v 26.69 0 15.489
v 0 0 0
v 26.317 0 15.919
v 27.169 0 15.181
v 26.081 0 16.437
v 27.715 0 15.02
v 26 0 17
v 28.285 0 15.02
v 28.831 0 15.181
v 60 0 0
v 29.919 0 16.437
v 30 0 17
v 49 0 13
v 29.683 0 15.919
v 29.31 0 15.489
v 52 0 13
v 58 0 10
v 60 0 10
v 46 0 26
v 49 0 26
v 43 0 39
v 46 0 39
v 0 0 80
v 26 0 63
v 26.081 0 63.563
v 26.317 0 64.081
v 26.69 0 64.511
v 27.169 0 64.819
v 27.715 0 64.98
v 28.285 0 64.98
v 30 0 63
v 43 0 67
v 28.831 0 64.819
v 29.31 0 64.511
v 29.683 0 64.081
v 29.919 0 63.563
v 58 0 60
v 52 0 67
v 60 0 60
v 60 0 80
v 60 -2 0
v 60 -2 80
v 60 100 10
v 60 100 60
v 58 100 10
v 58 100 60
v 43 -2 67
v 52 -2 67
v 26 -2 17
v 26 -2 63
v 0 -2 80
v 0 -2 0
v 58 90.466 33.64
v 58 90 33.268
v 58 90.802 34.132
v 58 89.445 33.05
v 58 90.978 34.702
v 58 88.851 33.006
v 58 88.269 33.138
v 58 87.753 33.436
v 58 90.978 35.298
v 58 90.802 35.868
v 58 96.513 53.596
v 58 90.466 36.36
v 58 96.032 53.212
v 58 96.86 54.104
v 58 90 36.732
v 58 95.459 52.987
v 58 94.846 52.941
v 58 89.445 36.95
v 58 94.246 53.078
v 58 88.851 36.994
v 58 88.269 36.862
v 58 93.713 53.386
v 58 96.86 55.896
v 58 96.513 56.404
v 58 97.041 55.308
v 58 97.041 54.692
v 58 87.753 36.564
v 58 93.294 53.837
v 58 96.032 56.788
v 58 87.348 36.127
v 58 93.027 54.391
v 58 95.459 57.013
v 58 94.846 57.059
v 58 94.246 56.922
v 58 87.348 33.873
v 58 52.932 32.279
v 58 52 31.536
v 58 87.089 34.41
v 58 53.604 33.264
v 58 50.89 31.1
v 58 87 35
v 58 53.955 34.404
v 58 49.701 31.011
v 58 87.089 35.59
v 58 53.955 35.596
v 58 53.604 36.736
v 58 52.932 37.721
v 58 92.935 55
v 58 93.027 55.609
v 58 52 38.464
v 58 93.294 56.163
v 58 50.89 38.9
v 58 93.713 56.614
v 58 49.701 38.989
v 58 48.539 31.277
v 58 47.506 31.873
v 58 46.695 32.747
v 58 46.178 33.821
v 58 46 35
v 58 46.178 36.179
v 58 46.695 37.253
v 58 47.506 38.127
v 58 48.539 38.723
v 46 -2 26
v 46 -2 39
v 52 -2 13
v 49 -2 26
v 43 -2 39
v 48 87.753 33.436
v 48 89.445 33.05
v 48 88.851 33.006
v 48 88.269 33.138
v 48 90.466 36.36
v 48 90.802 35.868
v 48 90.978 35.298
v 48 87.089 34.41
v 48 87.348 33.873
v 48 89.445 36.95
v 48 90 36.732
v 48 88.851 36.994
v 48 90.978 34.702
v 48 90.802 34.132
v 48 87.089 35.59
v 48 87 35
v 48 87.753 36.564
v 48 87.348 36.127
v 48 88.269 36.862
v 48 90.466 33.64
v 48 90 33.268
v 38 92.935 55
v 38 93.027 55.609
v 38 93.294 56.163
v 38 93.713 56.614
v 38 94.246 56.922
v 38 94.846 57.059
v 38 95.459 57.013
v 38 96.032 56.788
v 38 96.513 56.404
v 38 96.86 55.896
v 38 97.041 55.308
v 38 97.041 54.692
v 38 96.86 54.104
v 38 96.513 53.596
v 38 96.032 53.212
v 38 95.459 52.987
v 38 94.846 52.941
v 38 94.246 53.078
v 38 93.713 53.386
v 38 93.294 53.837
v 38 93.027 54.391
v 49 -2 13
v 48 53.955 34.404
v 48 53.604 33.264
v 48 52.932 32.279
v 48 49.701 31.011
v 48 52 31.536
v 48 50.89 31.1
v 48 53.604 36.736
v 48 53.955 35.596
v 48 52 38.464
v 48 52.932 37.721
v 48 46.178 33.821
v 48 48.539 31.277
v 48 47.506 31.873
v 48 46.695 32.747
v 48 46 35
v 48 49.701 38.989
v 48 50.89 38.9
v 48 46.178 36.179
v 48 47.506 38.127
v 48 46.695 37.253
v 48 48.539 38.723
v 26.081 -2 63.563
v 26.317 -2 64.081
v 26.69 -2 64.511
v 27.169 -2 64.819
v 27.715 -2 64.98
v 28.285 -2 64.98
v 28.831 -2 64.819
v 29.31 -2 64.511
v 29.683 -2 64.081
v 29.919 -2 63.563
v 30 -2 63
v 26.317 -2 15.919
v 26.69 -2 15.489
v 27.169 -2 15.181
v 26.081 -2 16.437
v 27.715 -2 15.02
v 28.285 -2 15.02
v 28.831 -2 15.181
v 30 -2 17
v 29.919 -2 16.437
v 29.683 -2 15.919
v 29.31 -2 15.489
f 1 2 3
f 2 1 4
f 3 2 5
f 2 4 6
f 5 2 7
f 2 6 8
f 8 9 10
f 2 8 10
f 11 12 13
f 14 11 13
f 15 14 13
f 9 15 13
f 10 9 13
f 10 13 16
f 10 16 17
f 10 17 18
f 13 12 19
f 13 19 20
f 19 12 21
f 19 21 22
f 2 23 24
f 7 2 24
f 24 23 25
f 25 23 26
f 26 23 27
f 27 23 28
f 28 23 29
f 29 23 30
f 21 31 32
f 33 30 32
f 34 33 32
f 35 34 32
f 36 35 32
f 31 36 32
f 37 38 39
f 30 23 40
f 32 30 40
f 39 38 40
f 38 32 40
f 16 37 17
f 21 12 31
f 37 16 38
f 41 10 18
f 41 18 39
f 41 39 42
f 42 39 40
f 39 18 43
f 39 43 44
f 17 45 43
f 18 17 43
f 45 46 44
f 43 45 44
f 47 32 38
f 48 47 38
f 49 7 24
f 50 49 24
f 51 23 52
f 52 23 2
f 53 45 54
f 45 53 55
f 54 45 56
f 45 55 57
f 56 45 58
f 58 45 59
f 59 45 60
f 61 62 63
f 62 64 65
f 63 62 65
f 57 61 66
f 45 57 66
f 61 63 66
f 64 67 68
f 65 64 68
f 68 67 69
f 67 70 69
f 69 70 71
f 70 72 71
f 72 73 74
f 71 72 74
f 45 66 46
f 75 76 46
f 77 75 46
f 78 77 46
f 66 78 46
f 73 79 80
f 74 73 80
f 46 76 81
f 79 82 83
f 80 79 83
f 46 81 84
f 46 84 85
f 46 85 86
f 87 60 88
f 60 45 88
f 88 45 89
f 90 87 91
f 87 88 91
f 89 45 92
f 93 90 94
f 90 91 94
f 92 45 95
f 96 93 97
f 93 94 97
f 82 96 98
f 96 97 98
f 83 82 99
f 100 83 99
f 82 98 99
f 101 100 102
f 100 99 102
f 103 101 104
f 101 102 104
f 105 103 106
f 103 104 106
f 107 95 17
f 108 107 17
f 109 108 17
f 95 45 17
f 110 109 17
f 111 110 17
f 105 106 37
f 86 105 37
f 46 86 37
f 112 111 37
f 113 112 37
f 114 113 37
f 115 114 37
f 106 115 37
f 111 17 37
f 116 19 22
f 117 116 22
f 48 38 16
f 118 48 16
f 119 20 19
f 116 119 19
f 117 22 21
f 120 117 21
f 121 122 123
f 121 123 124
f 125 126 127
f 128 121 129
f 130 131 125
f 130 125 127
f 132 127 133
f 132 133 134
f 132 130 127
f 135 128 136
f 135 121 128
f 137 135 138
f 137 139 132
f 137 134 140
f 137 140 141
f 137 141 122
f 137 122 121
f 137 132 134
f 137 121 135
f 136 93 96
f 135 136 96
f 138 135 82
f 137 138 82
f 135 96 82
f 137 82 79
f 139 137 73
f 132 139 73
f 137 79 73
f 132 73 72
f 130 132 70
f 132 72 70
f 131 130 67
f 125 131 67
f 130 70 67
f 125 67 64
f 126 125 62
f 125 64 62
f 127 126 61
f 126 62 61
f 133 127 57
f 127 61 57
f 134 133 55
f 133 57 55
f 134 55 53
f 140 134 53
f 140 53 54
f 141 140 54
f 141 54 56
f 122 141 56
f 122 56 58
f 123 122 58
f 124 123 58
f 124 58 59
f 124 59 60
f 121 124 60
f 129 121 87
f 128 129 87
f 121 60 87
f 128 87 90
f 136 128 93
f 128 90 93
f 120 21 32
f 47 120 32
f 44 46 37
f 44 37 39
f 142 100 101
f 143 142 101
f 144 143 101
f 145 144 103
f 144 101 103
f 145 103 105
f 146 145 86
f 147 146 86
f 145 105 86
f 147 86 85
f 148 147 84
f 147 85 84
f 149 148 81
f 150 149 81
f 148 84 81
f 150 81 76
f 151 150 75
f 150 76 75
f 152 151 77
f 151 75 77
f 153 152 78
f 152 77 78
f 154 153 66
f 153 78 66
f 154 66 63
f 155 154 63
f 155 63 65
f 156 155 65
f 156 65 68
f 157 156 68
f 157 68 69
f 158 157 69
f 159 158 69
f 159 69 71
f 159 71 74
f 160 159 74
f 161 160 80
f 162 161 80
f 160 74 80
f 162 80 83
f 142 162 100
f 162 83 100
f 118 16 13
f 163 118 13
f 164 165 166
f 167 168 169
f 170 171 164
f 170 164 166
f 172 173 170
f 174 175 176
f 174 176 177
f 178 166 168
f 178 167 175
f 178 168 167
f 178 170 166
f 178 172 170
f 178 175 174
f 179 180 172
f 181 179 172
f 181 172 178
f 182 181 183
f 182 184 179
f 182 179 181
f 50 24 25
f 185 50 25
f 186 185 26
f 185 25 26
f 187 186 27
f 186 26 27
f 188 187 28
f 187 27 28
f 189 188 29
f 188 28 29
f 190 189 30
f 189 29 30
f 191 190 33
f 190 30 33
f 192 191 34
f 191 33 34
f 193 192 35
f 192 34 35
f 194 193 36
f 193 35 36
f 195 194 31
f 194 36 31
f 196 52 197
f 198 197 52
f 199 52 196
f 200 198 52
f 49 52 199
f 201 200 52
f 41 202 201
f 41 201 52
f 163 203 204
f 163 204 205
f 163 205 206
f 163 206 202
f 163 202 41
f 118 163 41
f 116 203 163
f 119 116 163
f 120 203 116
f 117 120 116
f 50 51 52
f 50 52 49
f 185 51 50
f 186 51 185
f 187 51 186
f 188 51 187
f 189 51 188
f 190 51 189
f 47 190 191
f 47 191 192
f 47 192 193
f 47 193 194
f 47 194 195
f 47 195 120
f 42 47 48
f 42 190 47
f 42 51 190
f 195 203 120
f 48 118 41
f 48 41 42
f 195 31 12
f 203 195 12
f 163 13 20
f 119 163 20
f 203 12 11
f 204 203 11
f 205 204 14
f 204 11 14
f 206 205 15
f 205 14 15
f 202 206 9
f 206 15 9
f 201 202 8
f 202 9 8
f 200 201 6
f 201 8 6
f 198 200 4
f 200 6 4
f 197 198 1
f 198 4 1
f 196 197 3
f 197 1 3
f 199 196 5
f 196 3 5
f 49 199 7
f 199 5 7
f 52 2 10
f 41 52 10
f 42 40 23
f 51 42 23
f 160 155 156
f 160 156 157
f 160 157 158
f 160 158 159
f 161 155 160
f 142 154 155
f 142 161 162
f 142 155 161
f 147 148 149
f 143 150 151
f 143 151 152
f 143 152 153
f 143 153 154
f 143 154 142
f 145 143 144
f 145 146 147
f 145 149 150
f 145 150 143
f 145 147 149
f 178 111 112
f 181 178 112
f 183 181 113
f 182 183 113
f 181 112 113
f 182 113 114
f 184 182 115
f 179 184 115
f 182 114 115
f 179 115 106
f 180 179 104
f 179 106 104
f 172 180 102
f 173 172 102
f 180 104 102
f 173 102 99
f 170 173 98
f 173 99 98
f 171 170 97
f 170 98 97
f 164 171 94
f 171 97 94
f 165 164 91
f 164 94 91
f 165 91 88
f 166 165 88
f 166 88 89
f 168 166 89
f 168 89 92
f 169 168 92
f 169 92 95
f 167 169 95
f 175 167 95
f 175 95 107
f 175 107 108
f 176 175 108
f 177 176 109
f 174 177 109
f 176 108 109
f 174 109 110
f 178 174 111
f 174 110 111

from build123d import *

# Parameters (mm, degrees)
F0_W     = 2
F0_H     = 50
F1_DEPTH = 2
F2_DEPTH = 100
F3_R     = 4
F3_R_2   = 2
F4_DEPTH = 10
F3_R_3   = 2.064533
F5_DEPTH = 20


with BuildPart() as f1:
    # F0 (on Front) → F1 (new body)
    with BuildSketch(Plane.XZ):
        Polygon((0, 80), (0, 0), (60, 0), (60, 10), (58, 10), (58, 60), (60, 60), (60, 80), align=None)
        with BuildLine():
            Line((26, 17), (26, 63))
            ThreePointArc((26, 63), (28, 65), (30, 63))
            Line((30, 63), (30, 17))
            ThreePointArc((30, 17), (28, 15), (26, 17))
        make_face(mode=Mode.SUBTRACT)
        Polygon((43, 67), (52, 67), (52, 13), (49, 13), (49, 26), (46, 26), (46, 39), (43, 39), align=None, mode=Mode.SUBTRACT)
        with Locations((59, 35)):
            Rectangle(F0_W, F0_H)
    extrude(amount=F1_DEPTH)

    # F0 (on Front) → F2 (join)
    with BuildSketch(Plane.XZ):
        with Locations((59, 35)):
            Rectangle(F0_W, F0_H)
    extrude(amount=-F2_DEPTH)

    # F3 (on face) → F4 (join)
    with BuildSketch(Plane(origin=(58, 0, 0), x_dir=(0, -1, 0), z_dir=(-1, 0, 0))):
        with Locations((-50, 35)):
            Circle(F3_R)
        with Locations((-89, 35)):
            Circle(F3_R_2)
    extrude(amount=F4_DEPTH)

    # F3 (on face) → F5 (join)
    with BuildSketch(Plane(origin=(58, 0, 0), x_dir=(0, -1, 0), z_dir=(-1, 0, 0))):
        with Locations((-95, 55)):
            Circle(F3_R_3)
    extrude(amount=F5_DEPTH)


solid = f1.part
